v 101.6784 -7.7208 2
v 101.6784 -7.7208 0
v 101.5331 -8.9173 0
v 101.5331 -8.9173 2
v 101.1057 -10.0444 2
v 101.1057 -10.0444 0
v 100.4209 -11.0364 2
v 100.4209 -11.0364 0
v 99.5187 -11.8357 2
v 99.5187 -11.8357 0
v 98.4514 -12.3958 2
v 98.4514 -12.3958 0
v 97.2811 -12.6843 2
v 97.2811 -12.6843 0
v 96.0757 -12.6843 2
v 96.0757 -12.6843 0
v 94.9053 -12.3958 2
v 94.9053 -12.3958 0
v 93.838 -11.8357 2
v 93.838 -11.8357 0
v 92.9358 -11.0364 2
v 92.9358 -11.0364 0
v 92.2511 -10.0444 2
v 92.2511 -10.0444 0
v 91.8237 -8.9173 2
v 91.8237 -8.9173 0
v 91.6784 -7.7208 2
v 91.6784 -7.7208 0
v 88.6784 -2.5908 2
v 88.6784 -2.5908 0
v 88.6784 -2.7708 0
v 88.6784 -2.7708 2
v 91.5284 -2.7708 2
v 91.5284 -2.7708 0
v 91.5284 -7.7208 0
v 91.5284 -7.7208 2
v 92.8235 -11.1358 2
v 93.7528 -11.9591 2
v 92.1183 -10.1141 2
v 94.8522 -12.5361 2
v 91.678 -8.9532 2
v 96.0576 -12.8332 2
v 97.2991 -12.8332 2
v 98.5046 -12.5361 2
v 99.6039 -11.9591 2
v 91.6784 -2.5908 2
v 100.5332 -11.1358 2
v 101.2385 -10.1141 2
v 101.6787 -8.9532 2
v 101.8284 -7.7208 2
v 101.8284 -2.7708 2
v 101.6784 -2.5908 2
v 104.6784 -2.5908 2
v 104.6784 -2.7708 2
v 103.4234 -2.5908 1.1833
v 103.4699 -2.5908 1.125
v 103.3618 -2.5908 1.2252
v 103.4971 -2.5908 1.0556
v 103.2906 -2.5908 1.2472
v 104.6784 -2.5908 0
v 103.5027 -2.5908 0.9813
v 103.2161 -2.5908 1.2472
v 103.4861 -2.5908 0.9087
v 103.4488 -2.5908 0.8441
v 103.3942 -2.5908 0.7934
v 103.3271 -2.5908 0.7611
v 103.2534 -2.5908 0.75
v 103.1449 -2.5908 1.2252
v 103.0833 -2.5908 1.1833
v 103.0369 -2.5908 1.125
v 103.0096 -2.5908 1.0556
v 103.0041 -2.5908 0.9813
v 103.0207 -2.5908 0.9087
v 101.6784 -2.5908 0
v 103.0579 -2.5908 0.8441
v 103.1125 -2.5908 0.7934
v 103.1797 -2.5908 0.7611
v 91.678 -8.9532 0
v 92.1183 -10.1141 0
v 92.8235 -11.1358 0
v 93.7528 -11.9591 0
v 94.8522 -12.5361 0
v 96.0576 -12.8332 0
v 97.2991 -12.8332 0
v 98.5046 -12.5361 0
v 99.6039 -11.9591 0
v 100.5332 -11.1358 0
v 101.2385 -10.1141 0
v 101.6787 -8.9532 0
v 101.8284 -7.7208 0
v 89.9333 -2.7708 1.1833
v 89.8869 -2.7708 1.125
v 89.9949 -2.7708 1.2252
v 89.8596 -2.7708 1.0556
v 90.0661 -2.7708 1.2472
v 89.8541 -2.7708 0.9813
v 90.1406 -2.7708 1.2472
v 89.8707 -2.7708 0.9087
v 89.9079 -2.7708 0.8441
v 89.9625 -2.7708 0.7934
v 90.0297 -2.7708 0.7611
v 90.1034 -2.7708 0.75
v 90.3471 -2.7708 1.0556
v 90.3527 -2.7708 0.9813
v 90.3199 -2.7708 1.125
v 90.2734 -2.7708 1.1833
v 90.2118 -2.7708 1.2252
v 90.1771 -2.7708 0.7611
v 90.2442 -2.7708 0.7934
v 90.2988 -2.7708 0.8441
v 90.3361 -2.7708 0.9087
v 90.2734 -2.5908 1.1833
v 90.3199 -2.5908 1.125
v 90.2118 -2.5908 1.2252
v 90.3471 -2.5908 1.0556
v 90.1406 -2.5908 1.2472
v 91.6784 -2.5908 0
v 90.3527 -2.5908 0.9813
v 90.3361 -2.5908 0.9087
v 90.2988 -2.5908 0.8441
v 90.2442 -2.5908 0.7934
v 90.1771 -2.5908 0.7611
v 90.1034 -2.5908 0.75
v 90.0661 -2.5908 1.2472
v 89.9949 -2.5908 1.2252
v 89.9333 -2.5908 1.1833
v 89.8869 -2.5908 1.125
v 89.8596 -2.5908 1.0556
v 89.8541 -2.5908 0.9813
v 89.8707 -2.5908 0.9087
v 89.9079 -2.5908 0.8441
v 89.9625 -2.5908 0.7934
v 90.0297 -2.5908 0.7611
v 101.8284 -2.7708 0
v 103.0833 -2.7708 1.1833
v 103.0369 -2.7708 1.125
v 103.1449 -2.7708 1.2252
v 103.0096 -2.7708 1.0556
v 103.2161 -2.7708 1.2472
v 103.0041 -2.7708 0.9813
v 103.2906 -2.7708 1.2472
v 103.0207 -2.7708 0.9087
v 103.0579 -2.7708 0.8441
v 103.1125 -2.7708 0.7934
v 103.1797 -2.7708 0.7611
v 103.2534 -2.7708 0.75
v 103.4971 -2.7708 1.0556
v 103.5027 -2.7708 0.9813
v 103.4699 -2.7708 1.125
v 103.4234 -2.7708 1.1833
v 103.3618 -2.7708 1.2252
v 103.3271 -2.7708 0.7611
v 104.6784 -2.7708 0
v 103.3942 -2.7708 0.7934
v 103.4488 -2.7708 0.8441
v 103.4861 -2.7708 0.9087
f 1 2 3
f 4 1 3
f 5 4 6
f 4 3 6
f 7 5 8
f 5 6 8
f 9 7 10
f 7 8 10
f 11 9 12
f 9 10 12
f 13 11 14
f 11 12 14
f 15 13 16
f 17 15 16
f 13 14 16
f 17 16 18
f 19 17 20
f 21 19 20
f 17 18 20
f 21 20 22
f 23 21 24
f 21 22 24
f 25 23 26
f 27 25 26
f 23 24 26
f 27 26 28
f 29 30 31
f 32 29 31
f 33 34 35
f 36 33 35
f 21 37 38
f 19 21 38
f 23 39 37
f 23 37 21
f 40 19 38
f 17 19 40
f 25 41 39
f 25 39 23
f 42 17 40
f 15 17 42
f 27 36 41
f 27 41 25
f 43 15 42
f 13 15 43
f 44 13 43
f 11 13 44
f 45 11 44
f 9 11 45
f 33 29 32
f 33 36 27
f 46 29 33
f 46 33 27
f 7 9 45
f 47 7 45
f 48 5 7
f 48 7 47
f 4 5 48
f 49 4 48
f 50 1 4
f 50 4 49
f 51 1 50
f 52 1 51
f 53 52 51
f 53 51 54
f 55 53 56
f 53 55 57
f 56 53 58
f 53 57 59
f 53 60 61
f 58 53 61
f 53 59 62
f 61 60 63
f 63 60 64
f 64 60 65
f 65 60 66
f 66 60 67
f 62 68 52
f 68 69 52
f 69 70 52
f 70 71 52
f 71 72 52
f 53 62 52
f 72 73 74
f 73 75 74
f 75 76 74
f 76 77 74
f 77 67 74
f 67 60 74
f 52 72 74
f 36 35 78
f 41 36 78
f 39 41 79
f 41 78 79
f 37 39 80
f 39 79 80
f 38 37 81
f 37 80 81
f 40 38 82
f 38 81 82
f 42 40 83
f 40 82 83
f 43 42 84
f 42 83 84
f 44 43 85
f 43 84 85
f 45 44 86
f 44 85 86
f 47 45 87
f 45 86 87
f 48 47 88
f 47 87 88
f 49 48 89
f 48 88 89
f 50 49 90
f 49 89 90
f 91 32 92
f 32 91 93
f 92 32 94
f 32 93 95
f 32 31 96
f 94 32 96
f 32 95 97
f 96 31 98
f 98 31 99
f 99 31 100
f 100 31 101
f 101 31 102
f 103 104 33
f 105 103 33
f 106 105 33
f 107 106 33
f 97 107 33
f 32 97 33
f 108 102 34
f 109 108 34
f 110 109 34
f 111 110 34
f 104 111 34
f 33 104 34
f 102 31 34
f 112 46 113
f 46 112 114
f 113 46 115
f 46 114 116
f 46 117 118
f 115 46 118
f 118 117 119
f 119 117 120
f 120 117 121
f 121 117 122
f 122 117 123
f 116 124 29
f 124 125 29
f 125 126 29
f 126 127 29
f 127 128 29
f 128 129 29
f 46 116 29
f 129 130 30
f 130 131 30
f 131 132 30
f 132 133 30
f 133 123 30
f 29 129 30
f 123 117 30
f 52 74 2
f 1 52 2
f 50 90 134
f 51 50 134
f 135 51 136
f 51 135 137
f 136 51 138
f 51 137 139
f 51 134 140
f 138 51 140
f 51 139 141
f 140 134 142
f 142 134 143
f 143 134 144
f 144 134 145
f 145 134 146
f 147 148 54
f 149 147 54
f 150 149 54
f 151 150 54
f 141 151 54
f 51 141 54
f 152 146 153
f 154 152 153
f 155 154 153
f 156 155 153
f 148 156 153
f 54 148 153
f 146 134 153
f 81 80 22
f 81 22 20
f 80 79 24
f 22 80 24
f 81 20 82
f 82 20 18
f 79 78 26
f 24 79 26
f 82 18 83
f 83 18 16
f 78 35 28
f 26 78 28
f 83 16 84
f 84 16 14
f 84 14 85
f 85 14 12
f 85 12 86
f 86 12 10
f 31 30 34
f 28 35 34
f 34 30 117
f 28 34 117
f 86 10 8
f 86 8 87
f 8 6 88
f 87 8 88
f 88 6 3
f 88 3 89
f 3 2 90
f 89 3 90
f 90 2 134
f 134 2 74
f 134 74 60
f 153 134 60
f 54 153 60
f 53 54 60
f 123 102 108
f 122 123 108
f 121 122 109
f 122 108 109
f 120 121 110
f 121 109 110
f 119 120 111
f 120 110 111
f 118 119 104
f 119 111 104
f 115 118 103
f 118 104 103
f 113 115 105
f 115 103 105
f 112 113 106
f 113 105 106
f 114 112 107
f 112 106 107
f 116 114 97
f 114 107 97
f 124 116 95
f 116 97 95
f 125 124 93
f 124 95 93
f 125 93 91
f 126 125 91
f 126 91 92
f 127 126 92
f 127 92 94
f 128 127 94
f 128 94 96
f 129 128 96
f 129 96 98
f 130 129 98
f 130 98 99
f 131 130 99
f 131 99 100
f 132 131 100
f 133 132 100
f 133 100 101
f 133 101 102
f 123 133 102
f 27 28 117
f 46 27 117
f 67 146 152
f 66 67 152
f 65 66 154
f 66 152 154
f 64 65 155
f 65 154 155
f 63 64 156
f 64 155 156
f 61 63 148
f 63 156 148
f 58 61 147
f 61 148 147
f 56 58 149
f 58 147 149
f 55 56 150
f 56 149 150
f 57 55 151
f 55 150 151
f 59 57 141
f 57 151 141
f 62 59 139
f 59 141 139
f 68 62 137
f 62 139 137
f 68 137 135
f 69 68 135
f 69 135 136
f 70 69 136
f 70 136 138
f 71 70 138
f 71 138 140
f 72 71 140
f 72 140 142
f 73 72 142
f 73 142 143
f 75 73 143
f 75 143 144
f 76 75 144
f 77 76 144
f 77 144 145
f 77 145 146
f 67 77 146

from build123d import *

# Parameters (mm, degrees)
RESSALTO_EXTRUS_O1_DEPTH = 2
ESBO_O2_R                = 0.25
CORTE_EXTRUS_O2_DEPTH    = 2


with BuildPart() as part:
    # Esboço1 → Ressalto-extrusão1 (new body)
    with BuildSketch(Plane.XY):
        with BuildLine():
            Line((104.678372413, -2.590763748), (101.678372413, -2.590763748))
            Line((101.678372413, -2.590763748), (101.678372413, -7.720763748))
            ThreePointArc((101.678372413, -7.720763748), (96.678372413, -12.720763748), (91.678372413, -7.720763748))
            Line((91.678372413, -7.720763748), (91.678372413, -2.590763748))
            Line((91.678372413, -2.590763748), (88.678372413, -2.590763748))
            Line((88.678372413, -2.590763748), (88.678372413, -2.770763748))
            Line((88.678372413, -2.770763748), (91.528372413, -2.770763748))
            Line((91.528372413, -2.770763748), (91.528372413, -7.720763748))
            ThreePointArc((91.528372413, -7.720763748), (96.678372413, -12.870763748), (101.828372413, -7.720763748))
            Line((101.828372413, -7.720763748), (101.828372413, -2.770763748))
            Line((101.828372413, -2.770763748), (104.678372413, -2.770763748))
            Line((104.678372413, -2.770763748), (104.678372413, -2.590763748))
        make_face()
    extrude(amount=RESSALTO_EXTRUS_O1_DEPTH)

    # Esboço2 → Corte-extrusão2 (cut)
    with BuildSketch(Plane.XZ.offset(2.770763748)):
        with Locations(Location((90.103372413, 1, 0), (0, 0, 270))):
            Circle(ESBO_O2_R)
        with Locations(Location((103.253372413, 1, 0), (0, 0, 270))):
            Circle(ESBO_O2_R)
    extrude(amount=-CORTE_EXTRUS_O2_DEPTH, mode=Mode.SUBTRACT)


solid = part.part
